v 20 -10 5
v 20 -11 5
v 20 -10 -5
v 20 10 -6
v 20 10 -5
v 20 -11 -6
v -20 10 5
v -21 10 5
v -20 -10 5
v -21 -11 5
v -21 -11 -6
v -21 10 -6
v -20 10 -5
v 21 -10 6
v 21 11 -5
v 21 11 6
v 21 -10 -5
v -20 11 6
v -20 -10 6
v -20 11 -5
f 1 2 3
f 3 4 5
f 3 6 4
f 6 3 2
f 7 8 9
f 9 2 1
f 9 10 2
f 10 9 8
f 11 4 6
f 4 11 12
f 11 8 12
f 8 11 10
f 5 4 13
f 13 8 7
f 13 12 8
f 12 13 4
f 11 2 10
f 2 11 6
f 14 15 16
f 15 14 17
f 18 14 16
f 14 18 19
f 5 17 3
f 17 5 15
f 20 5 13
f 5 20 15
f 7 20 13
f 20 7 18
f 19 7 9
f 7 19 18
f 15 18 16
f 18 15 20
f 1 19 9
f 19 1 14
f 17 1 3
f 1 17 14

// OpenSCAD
// Unit of length: Unit.MM
union()
{
   color(c = [1.0, 0.0, 0.0, 1.0])
   {
      translate(v = [-0.5, -0.5, -0.5])
      {
         cube(size = [41.0, 21.0, 11.0], center = true);
      }
   }
   translate(v = [0.5, 0.5, 0.5])
   {
      cube(size = [41.0, 21.0, 11.0], center = true);
   }
}
